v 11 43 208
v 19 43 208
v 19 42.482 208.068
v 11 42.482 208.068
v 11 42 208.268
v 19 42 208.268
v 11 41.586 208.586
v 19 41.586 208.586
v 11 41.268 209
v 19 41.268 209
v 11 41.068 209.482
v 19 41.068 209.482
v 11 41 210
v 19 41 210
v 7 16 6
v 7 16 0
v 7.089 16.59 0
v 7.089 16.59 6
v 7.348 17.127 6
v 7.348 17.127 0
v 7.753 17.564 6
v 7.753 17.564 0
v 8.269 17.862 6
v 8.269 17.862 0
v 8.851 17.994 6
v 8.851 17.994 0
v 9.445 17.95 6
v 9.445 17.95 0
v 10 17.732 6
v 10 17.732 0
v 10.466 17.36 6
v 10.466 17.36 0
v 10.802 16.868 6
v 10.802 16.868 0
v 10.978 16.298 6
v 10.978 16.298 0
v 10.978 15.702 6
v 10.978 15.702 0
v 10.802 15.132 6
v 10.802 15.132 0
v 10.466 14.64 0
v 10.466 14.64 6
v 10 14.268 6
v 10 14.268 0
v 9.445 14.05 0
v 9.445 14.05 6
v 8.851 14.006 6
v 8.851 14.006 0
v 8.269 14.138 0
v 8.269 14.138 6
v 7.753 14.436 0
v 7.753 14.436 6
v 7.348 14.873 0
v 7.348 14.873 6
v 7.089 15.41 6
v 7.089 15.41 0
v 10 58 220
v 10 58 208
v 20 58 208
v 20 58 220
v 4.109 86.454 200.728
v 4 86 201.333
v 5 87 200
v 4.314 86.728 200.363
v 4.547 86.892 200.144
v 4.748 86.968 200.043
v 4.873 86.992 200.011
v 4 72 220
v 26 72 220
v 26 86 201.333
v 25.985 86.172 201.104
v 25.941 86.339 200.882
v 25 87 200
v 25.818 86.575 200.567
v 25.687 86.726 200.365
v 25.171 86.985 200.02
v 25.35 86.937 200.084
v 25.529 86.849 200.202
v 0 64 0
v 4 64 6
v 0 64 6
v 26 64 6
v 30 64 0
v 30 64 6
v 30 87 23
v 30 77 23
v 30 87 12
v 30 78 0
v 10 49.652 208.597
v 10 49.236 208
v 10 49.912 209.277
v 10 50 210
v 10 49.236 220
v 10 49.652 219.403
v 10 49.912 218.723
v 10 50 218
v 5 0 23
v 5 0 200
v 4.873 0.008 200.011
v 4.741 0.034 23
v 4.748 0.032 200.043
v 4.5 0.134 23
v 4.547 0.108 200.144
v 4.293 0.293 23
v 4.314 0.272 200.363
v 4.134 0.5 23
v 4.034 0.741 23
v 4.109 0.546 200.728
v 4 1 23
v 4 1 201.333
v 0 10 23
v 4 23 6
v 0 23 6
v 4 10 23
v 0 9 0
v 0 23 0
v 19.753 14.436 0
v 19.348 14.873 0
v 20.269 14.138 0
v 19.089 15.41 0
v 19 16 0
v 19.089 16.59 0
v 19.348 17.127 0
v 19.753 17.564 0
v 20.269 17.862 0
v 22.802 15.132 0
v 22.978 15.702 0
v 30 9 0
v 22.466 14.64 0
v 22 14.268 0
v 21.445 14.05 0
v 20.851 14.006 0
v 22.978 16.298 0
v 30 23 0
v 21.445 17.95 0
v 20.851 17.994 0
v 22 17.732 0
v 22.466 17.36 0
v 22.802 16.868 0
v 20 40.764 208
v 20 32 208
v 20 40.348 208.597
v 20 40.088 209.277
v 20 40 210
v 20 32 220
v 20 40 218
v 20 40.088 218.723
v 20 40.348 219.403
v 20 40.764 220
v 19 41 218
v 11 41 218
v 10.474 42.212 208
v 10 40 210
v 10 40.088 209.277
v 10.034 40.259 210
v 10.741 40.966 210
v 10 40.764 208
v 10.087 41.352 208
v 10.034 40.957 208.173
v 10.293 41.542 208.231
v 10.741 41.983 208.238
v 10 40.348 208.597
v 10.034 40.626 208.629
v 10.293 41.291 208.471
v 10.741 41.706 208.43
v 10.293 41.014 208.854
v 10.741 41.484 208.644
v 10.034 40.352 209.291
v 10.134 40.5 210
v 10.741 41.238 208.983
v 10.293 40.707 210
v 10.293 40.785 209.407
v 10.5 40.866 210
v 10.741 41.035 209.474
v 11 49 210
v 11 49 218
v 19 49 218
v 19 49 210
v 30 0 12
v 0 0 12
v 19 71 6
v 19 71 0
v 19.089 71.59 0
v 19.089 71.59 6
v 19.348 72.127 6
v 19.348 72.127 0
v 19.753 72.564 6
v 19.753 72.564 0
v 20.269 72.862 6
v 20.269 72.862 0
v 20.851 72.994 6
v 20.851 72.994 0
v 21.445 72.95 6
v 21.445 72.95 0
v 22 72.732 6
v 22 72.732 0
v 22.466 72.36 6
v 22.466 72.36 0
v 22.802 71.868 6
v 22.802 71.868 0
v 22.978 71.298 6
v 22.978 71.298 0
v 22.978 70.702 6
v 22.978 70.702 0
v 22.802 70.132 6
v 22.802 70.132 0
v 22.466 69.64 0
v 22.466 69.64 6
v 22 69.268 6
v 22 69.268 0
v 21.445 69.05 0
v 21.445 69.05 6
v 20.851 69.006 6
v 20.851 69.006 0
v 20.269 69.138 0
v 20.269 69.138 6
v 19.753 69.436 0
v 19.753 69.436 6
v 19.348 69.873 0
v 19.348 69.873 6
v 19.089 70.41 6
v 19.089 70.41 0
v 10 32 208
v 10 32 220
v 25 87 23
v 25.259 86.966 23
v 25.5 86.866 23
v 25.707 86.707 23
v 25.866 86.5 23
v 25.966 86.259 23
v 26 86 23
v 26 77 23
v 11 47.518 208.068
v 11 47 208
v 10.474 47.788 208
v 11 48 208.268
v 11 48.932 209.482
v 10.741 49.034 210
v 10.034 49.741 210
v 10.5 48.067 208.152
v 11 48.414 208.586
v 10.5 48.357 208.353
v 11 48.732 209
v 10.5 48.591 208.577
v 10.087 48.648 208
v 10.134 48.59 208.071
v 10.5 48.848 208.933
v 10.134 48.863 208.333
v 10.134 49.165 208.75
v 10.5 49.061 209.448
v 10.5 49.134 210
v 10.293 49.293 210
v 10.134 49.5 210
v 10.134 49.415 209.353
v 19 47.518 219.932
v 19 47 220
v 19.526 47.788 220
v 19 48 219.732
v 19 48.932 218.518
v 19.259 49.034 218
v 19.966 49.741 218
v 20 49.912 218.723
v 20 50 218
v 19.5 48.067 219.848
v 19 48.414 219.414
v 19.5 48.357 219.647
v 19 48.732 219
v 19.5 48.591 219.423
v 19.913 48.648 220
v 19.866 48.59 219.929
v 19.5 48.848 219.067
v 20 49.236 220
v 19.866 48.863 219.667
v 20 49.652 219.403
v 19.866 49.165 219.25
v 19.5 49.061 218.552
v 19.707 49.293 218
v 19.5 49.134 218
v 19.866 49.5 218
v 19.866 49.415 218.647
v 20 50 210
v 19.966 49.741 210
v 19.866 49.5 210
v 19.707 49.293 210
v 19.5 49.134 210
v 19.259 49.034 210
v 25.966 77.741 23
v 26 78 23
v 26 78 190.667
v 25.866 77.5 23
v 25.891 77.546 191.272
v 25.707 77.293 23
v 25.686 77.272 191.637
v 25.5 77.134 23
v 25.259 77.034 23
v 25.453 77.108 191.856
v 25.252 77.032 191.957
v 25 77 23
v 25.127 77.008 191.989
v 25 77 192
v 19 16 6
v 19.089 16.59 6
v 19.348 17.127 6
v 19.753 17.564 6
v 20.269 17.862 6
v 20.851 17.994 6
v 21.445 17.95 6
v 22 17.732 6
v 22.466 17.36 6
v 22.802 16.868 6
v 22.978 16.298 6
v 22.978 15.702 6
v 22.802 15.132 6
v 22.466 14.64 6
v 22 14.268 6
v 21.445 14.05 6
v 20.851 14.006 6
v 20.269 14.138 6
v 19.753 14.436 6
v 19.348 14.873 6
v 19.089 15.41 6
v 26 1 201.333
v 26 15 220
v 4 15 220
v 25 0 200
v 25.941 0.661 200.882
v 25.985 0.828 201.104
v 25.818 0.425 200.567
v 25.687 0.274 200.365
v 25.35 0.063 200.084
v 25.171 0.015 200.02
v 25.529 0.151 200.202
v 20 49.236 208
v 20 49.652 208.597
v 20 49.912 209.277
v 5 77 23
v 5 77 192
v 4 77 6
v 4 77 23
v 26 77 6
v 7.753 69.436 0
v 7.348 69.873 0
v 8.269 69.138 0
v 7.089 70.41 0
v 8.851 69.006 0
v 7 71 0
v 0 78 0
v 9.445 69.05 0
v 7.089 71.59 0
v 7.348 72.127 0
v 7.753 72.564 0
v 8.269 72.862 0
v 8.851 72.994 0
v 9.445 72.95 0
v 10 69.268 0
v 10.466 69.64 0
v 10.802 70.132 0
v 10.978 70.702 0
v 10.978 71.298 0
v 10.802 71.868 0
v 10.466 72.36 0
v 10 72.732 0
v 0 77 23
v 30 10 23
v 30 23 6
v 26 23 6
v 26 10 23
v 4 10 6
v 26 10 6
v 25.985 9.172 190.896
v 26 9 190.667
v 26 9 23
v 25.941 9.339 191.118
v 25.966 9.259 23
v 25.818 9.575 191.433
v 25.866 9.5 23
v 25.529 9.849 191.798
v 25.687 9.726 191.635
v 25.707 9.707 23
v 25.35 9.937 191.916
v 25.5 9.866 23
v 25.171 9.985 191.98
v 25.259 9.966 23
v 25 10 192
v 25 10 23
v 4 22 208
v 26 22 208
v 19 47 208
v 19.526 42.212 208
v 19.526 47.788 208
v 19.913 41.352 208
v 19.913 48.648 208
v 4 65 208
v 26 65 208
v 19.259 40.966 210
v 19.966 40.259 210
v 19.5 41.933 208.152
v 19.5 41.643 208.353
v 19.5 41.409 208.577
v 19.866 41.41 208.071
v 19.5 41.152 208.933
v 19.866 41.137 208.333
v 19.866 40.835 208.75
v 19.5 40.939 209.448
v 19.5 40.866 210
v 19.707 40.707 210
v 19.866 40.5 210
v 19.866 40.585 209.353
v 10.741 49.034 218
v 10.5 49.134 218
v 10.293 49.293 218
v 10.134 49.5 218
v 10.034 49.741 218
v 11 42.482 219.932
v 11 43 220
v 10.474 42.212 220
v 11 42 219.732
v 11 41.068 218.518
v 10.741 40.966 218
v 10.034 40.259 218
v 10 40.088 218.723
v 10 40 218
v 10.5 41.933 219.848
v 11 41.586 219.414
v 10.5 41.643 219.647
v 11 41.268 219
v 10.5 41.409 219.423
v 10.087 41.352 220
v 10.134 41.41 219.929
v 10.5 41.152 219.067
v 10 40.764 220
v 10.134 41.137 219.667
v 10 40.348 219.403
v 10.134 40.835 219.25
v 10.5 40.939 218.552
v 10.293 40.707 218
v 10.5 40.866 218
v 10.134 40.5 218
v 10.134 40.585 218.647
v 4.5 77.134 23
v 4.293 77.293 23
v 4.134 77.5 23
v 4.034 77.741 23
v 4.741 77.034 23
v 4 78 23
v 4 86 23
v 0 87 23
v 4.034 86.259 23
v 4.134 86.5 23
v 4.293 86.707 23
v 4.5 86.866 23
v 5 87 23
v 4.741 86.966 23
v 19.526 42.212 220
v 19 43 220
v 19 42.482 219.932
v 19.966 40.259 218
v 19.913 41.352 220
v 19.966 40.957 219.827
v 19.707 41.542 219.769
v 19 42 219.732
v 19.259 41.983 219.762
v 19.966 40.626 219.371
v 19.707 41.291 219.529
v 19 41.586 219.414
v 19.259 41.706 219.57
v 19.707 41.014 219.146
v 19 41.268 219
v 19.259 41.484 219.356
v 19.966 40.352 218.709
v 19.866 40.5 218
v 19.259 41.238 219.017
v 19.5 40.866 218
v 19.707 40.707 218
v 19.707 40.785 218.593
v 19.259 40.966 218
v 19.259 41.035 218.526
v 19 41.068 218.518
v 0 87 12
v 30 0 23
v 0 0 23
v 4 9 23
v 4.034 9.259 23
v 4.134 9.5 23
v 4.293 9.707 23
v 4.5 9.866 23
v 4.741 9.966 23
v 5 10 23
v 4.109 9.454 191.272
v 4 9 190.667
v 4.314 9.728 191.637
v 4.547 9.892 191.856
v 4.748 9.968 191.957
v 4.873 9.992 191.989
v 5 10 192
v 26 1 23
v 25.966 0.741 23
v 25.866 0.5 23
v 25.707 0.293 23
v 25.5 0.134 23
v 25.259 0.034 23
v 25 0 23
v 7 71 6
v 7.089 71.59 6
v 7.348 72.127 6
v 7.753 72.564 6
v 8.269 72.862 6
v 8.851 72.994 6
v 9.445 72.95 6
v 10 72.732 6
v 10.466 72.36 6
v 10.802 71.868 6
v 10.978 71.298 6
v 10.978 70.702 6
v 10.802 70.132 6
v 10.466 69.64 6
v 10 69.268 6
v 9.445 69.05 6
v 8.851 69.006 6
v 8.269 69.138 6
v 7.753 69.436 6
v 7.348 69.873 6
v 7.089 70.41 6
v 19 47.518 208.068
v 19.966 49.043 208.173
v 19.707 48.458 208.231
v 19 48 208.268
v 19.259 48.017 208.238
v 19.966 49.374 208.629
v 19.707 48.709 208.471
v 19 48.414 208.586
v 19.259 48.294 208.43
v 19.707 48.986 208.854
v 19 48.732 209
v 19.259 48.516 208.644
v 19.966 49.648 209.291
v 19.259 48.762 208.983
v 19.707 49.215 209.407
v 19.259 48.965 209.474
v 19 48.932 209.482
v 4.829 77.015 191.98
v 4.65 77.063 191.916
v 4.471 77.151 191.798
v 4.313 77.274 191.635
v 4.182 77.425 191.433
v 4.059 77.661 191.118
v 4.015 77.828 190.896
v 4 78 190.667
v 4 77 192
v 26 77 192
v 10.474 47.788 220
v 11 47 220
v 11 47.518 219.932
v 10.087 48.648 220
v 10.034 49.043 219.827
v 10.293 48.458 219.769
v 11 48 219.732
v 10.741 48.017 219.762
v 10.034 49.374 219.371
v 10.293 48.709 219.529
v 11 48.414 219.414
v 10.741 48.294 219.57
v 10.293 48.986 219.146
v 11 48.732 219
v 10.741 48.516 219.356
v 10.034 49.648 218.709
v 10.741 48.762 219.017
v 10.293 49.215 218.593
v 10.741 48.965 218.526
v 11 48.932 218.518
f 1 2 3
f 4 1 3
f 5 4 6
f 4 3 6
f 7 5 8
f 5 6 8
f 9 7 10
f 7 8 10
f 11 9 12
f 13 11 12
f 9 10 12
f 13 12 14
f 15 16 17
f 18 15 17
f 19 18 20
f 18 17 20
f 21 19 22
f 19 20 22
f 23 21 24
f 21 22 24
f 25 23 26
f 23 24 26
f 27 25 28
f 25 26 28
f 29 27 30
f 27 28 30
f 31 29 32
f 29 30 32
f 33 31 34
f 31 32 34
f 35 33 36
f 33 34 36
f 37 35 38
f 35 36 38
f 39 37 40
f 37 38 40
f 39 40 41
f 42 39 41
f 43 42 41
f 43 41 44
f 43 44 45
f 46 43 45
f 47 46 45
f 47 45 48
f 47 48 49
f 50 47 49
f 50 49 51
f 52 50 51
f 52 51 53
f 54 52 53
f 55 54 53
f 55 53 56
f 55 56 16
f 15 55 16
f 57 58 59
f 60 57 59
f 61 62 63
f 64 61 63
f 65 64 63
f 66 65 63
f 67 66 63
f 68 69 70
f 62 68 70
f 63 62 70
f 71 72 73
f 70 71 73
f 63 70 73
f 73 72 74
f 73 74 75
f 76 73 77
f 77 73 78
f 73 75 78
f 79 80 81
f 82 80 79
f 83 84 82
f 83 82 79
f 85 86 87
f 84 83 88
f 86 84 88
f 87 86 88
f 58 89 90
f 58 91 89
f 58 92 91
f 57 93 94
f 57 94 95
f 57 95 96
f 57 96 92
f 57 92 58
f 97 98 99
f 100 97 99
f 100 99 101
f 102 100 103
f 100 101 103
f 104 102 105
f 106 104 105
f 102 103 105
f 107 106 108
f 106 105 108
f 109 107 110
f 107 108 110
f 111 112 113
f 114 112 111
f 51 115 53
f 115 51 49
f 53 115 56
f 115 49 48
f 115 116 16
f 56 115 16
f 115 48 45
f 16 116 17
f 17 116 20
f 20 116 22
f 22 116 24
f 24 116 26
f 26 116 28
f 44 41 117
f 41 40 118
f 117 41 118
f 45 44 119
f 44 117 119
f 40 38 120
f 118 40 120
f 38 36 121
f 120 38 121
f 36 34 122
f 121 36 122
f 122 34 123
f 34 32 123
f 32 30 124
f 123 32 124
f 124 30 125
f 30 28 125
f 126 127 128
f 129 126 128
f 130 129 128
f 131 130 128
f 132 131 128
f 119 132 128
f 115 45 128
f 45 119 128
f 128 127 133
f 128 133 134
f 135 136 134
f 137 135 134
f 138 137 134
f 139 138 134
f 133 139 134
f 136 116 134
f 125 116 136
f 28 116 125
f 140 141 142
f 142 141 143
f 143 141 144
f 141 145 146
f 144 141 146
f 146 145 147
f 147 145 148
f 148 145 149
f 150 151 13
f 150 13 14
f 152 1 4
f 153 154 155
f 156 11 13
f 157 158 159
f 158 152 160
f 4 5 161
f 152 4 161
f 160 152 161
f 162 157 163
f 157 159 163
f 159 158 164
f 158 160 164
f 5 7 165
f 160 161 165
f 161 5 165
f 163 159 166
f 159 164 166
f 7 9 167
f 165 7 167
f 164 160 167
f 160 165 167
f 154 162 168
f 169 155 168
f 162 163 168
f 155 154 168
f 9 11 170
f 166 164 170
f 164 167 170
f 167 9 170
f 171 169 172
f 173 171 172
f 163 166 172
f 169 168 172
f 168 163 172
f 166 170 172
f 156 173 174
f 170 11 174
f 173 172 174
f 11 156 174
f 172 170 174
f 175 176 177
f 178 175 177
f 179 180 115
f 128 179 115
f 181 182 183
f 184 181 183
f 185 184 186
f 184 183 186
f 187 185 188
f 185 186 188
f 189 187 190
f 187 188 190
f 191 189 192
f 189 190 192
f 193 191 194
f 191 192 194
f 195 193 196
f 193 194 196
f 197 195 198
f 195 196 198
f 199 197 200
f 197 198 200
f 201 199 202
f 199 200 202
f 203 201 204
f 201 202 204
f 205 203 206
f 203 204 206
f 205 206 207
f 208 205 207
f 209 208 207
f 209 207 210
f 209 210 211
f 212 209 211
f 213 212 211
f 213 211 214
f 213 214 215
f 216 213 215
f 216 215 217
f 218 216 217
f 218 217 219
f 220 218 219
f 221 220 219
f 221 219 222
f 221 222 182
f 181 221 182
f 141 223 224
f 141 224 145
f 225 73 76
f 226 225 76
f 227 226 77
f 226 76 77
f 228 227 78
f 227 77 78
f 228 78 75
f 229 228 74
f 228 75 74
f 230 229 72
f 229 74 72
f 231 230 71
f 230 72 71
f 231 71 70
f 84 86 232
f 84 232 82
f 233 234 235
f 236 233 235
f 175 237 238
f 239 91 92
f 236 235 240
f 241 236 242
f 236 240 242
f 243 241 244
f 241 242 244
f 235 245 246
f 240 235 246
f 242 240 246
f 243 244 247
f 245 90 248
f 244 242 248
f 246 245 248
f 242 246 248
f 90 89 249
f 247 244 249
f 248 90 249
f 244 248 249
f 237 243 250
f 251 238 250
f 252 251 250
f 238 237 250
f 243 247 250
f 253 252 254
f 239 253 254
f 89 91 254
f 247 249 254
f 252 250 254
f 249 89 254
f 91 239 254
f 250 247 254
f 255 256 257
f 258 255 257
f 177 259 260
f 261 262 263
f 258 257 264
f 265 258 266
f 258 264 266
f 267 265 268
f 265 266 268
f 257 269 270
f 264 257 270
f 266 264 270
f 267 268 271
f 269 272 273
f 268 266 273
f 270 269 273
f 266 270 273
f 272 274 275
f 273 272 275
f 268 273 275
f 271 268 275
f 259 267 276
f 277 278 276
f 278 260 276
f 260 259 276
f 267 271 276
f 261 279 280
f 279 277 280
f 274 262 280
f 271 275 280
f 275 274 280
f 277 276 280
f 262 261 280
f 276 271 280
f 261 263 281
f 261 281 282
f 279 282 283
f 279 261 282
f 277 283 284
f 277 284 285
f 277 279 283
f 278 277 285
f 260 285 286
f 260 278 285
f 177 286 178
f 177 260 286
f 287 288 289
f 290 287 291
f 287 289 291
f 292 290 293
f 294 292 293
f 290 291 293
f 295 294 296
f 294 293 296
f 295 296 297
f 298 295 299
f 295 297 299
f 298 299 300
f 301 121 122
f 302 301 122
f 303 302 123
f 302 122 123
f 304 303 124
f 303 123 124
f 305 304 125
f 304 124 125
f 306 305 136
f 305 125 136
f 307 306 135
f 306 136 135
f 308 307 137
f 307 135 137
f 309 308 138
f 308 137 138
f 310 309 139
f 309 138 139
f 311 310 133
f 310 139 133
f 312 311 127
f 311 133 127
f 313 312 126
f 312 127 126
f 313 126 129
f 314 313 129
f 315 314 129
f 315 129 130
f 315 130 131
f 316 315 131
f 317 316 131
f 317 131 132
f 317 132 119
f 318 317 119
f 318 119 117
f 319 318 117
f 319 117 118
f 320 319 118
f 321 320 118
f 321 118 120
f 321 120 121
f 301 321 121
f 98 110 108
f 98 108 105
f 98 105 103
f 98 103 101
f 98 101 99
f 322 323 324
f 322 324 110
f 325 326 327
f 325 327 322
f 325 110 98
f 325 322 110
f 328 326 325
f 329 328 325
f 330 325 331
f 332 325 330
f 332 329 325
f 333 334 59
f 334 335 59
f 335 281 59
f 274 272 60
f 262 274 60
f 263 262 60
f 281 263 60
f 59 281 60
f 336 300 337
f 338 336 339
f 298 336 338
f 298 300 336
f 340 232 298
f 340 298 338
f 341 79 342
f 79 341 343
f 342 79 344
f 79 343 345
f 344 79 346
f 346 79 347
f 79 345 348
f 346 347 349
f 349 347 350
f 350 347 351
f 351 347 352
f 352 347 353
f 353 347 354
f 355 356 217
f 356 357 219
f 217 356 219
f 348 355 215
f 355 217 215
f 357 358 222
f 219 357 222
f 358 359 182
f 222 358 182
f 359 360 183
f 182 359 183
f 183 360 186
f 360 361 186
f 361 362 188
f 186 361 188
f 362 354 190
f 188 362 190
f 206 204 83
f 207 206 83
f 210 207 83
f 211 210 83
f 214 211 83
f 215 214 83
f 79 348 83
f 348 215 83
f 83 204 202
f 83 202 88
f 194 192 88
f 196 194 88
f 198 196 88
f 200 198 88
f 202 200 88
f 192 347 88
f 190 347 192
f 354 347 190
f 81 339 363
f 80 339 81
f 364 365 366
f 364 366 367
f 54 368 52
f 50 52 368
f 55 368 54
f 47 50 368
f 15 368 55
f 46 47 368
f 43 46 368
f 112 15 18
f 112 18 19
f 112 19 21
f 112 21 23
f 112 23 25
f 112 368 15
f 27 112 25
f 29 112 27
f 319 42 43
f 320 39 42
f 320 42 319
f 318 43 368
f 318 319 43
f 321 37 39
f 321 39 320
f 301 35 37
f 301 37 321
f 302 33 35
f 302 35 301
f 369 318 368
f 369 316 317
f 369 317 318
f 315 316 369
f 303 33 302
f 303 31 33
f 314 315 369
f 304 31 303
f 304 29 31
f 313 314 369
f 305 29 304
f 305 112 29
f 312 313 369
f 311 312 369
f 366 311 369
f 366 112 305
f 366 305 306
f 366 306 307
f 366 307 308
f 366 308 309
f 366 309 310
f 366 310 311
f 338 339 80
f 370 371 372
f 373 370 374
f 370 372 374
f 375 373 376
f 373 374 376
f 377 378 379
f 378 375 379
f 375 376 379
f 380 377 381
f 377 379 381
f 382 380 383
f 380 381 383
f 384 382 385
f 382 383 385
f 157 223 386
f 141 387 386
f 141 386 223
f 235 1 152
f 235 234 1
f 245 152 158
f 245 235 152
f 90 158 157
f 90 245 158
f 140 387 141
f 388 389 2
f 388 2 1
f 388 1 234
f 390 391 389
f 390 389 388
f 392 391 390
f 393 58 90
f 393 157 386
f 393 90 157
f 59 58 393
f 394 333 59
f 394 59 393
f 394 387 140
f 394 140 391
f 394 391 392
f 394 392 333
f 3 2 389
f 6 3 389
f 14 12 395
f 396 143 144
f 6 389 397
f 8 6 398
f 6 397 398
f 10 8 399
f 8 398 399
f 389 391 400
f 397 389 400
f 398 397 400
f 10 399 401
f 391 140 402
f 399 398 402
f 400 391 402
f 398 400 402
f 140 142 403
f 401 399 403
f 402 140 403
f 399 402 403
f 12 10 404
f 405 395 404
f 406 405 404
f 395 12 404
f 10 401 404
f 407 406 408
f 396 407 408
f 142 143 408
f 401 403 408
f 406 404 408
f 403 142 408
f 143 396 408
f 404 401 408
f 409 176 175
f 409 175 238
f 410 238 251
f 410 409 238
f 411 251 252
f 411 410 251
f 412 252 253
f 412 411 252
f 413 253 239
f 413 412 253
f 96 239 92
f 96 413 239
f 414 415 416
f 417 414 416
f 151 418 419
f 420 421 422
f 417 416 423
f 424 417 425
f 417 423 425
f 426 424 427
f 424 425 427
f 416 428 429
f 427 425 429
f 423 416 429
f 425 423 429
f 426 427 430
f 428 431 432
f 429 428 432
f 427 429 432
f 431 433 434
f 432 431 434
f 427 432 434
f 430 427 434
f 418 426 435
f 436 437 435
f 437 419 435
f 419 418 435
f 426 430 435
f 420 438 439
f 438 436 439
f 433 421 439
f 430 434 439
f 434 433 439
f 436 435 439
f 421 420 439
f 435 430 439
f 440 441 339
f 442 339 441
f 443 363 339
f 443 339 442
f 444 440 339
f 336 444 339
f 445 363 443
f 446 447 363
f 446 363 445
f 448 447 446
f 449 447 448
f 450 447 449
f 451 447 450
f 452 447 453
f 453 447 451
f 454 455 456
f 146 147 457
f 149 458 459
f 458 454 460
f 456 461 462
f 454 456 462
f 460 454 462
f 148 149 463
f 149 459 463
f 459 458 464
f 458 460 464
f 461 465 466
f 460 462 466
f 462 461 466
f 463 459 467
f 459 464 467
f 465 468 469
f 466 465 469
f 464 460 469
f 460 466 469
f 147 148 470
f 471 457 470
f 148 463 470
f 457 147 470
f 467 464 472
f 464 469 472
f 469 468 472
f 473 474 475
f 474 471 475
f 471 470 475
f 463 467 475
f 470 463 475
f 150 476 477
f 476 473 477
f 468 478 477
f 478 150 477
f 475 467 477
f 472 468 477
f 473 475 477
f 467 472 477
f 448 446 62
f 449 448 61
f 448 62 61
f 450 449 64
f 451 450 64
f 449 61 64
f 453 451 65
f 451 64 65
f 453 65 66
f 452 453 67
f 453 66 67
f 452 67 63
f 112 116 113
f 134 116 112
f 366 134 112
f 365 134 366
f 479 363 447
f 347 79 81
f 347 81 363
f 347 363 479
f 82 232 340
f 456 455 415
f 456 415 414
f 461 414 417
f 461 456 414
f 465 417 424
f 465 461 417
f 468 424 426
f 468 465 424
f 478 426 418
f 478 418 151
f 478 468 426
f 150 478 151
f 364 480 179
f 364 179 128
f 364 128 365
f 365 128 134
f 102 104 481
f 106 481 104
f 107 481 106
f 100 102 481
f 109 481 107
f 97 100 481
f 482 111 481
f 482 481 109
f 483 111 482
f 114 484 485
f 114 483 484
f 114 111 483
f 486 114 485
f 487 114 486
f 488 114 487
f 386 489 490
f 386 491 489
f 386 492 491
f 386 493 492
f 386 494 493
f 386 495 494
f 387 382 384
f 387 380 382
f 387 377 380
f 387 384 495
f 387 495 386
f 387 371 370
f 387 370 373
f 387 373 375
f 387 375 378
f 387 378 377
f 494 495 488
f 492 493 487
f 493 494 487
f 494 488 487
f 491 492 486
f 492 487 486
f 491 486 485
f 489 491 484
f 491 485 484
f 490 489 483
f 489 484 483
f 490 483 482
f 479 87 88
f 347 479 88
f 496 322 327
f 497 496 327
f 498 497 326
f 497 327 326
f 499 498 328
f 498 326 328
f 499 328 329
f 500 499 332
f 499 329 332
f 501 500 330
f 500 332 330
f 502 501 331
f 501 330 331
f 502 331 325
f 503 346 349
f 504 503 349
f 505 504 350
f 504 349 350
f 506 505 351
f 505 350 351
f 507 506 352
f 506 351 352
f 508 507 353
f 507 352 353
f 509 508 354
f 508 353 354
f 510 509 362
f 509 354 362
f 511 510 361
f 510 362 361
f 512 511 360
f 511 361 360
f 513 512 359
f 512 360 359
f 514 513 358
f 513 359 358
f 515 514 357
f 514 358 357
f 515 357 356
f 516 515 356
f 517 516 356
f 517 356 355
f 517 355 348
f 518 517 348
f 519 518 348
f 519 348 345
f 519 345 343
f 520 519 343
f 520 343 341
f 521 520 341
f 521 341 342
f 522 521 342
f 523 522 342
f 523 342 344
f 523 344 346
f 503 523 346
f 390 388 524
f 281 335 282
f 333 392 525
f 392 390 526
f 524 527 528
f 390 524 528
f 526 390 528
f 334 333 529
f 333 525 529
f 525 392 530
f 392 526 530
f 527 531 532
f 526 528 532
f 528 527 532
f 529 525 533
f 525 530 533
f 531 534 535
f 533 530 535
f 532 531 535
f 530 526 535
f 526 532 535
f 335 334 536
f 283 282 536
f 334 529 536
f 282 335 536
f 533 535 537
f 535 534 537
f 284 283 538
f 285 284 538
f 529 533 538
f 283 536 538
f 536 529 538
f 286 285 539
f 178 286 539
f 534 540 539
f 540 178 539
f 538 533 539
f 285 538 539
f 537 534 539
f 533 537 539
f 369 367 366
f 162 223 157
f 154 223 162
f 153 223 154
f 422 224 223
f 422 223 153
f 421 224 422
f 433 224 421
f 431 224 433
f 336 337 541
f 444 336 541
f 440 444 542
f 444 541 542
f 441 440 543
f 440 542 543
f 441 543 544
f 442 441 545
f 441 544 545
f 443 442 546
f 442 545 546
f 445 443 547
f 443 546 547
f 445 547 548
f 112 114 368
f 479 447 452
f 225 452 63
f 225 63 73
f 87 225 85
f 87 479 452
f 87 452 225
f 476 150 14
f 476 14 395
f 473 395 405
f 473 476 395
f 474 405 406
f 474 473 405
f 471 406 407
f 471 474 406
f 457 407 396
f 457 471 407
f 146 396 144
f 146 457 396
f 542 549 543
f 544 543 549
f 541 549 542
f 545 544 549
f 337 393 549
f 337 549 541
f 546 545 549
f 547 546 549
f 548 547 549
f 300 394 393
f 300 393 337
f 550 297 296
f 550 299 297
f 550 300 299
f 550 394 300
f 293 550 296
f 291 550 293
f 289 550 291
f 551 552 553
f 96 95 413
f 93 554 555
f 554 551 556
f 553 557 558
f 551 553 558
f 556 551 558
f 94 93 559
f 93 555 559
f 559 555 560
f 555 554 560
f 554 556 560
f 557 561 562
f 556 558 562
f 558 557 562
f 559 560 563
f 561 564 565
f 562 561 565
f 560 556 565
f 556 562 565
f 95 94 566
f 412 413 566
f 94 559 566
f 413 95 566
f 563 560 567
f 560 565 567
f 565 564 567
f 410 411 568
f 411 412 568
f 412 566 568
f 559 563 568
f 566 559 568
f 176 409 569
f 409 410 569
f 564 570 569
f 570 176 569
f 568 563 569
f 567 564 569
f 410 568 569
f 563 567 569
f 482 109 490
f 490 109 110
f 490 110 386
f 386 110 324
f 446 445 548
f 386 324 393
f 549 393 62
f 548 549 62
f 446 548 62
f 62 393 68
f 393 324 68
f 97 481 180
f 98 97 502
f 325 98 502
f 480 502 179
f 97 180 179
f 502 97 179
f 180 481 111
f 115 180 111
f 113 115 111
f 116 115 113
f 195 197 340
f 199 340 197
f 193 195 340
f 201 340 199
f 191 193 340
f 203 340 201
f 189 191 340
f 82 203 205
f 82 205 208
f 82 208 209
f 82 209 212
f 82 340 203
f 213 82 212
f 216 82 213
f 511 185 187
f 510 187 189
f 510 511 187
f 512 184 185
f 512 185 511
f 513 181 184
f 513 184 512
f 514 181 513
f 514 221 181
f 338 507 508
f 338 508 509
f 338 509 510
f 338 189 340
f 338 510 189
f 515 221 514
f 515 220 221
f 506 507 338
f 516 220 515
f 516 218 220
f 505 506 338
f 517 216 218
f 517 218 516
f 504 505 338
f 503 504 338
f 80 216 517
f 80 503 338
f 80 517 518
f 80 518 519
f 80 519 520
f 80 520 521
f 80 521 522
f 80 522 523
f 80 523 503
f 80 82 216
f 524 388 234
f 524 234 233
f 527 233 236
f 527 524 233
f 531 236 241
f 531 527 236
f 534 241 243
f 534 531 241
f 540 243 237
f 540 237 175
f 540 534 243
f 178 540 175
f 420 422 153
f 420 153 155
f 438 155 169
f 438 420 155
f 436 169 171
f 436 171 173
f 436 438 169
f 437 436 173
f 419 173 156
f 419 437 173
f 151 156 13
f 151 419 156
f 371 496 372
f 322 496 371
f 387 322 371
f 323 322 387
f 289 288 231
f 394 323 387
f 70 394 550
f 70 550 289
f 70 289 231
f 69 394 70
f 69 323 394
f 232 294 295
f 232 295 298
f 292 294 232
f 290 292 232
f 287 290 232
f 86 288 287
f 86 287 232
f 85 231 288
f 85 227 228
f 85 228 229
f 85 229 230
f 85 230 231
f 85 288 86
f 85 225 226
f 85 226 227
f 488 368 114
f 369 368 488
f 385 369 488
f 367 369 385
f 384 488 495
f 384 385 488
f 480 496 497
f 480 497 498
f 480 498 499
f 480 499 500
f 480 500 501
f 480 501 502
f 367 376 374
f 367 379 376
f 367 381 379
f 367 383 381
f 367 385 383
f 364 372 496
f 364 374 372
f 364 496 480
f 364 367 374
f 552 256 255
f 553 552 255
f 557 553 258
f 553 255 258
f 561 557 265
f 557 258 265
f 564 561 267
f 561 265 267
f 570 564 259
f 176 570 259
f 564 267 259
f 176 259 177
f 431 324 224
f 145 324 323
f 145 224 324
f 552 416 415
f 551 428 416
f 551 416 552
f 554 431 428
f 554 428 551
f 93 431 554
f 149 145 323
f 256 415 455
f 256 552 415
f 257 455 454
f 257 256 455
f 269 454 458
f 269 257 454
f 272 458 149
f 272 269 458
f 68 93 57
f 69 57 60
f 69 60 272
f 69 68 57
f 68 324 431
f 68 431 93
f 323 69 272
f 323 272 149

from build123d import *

# Parameters (mm, degrees)
SKETCH1_W                 = 30
SKETCH1_H                 = 87
BOSS_EXTRUDE1_DEPTH       = 220
CUT_EXTRUDE1_DEPTH        = 239.472220604
SKETCH3_W                 = 22
SKETCH3_H                 = 22
CUT_EXTRUDE2_DEPTH        = 13
SKETCH4_W                 = 22
SKETCH4_H                 = 22
CUT_EXTRUDE3_DEPTH        = 13
CUT_EXTRUDE4_REACH        = 240.472
SKETCH5_W                 = 10
SKETCH5_H                 = 9
SKETCH6_W                 = 4
SKETCH6_H                 = 87
CUT_EXTRUDE5_DEPTH        = 197
F_4_0MM_DOWEL_HOLE1_D     = 4
F_4_0MM_DOWEL_HOLE1_DEPTH = 6
FILLET1_R                 = 2
FILLET2_R                 = 1


with BuildPart() as part:
    # Sketch1 → Boss-Extrude1 (new body)
    with BuildSketch(Plane.XY):
        with Locations((15, 43.5)):
            Rectangle(SKETCH1_W, SKETCH1_H)
    extrude(amount=BOSS_EXTRUDE1_DEPTH)

    # Sketch2 → Cut-Extrude1 (cut, through all)
    with BuildSketch(Plane(origin=(30, 0, 0), x_dir=(0, 0, -1), z_dir=(1, 0, 0))):
        Polygon((-192, 77), (-23, 77), (-6, 64), (0, 64), (0, 23), (-6, 23), (-23, 10), (-192, 10), (-208, 22), (-208, 65), align=None)
        Polygon((0, 87), (-12, 87), (0, 78), align=None)
        Polygon((0, 0), (-12, 0), (0, 9), align=None)
        Polygon((-220, 87), (-220, 72), (-200, 87), align=None)
        Polygon((-220, 0), (-220, 15), (-200, 0), align=None)
    extrude(amount=-CUT_EXTRUDE1_DEPTH, mode=Mode.SUBTRACT)

    # Sketch3 → Cut-Extrude2 (cut)
    with BuildSketch(Plane(origin=(0, 64, 0), x_dir=(-1, 0, 0), z_dir=(0, -1, 0))):
        with Locations((-15, -17)):
            Rectangle(SKETCH3_W, SKETCH3_H)
    extrude(amount=-CUT_EXTRUDE2_DEPTH, mode=Mode.SUBTRACT)

    # Sketch4 → Cut-Extrude3 (cut)
    with BuildSketch(Plane(origin=(0, 23, 0), x_dir=(1, 0, 0), z_dir=(0, 1, 0))):
        with Locations((15, -17)):
            Rectangle(SKETCH4_W, SKETCH4_H)
    extrude(amount=-CUT_EXTRUDE3_DEPTH, mode=Mode.SUBTRACT)

    # Sketch5 → Cut-Extrude4 (cut, up to next)
    with BuildSketch(Plane.XY.offset(220), mode=Mode.PRIVATE) as cut_extrude4_sk1:
        with Locations((15, 53.5)):
            Rectangle(SKETCH5_W, SKETCH5_H)
    cut_extrude4_tool1 = extrude(cut_extrude4_sk1.sketch, amount=-CUT_EXTRUDE4_REACH, mode=Mode.PRIVATE) & part.part
    # Sketch5 → Cut-Extrude4 (cut, up to next)
    with BuildSketch(Plane.XY.offset(220), mode=Mode.PRIVATE) as cut_extrude4_sk2:
        with Locations((15, 36.5)):
            Rectangle(SKETCH5_W, SKETCH5_H)
    cut_extrude4_tool2 = extrude(cut_extrude4_sk2.sketch, amount=-CUT_EXTRUDE4_REACH, mode=Mode.PRIVATE) & part.part
    add(cut_extrude4_tool1.solids().sort_by_distance((15, 53.5, 220))[0], mode=Mode.SUBTRACT)
    add(cut_extrude4_tool2.solids().sort_by_distance((15, 36.5, 220))[0], mode=Mode.SUBTRACT)

    # Sketch6 → Cut-Extrude5 (cut)
    with BuildSketch(Plane.XY.offset(220)):
        with Locations((2, 43.5)):
            Rectangle(SKETCH6_W, SKETCH6_H)
        with Locations((28, 43.5)):
            Rectangle(SKETCH6_W, SKETCH6_H)
    extrude(amount=-CUT_EXTRUDE5_DEPTH, mode=Mode.SUBTRACT)

    # Ø4.0mm Dowel Hole1
    with Locations(Plane.XY.offset(6)):
        with Locations((9, 16), (9, 71), (21, 71), (21, 16)):
            Hole(F_4_0MM_DOWEL_HOLE1_D / 2, depth=F_4_0MM_DOWEL_HOLE1_DEPTH)

    # Fillet1
    fillet1_edges = [part.edges().sort_by_distance(p)[0] for p in [
        (15, 49, 220),
        (15, 49, 208),
        (15, 41, 220),
        (15, 41, 208),
    ]]
    fillet(fillet1_edges, radius=FILLET1_R)

    # Fillet2
    # the kernel refuses this fillet: 1 mm, written as the material it adds along each edge
    with BuildSketch(Plane(origin=(10, 49, 218), x_dir=(1, 0, 0), z_dir=(0, 0, -1)), Plane(origin=(20, 41, 218), x_dir=(-1, 0, 0), z_dir=(0, 0, -1))) as fillet2_piece_1:
        with BuildLine():
            CenterArc((FILLET2_R, -FILLET2_R), FILLET2_R, 90, 90)
            Line((0, -FILLET2_R), (0, 0))
            Line((0, 0), (FILLET2_R, 0))
        make_face()
    extrude(amount=8)
    with BuildSketch(Plane(origin=(20, 49, 218), x_dir=(-1, 0, 0), z_dir=(0, 0, -1)), Plane(origin=(10, 41, 218), x_dir=(1, 0, 0), z_dir=(0, 0, -1))) as fillet2_piece_2:
        with BuildLine():
            CenterArc((FILLET2_R, FILLET2_R), FILLET2_R, 180, 90)
            Line((0, FILLET2_R), (0, 0))
            Line((0, 0), (FILLET2_R, 0))
        make_face()
    extrude(amount=8)
    with BuildSketch(Plane(origin=(10, 47, 210), x_dir=(0, -0.9491428341660849, -0.31484580408697216), z_dir=(0, -0.31484580408697216, 0.9491428341660849))) as fillet2_piece_3_section:
        with BuildLine():
            CenterArc((2 + FILLET2_R, FILLET2_R), FILLET2_R, 180, 90)
            Line((2 + FILLET2_R, 0), (2, 0))
            Line((2, 0), (2, FILLET2_R))
        make_face()
    fillet2_piece_3 = revolve(axis=Axis((10, 47, 210), (1, 0, 0)), revolution_arc=161.648494619, mode=Mode.PRIVATE)
    fillet2_piece_3 = split(fillet2_piece_3, bisect_by=Plane(origin=(10.272150961, 48.462196414, 208), z_dir=(0, 0, 1)), keep=Keep.TOP, mode=Mode.PRIVATE)
    add(fillet2_piece_3)
    with BuildSketch(Plane(origin=(20, 47, 210), x_dir=(0, -0.9491428341660849, -0.31484580408697216), z_dir=(0, -0.31484580408697216, 0.9491428341660849))) as fillet2_piece_4_section:
        with BuildLine():
            CenterArc((2 + FILLET2_R, -FILLET2_R), FILLET2_R, 90, 90)
            Line((2 + FILLET2_R, 0), (2, 0))
            Line((2, 0), (2, -FILLET2_R))
        make_face()
    fillet2_piece_4 = revolve(axis=Axis((20, 47, 210), (1, 0, 0)), revolution_arc=161.648494619, mode=Mode.PRIVATE)
    fillet2_piece_4 = split(fillet2_piece_4, bisect_by=Plane(origin=(19.727849107, 48.462196279, 208), z_dir=(0, 0, 1)), keep=Keep.TOP, mode=Mode.PRIVATE)
    add(fillet2_piece_4)
    with BuildSketch(Plane(origin=(20, 43, 210), x_dir=(0, 0.9491428341660849, -0.31484580408697216), z_dir=(0, 0.31484580408697216, 0.9491428341660849))) as fillet2_piece_5_section:
        with BuildLine():
            CenterArc((2 + FILLET2_R, FILLET2_R), FILLET2_R, 180, 90)
            Line((2 + FILLET2_R, 0), (2, 0))
            Line((2, 0), (2, FILLET2_R))
        make_face()
    fillet2_piece_5 = revolve(axis=Axis((20, 43, 210), (-1, 0, 0)), revolution_arc=161.648494619, mode=Mode.PRIVATE)
    fillet2_piece_5 = split(fillet2_piece_5, bisect_by=Plane(origin=(19.727848664, 41.537804063, 208), z_dir=(0, 0, 1)), keep=Keep.TOP, mode=Mode.PRIVATE)
    add(fillet2_piece_5)
    with BuildSketch(Plane(origin=(10, 43, 210), x_dir=(0, 0.9491428341660849, -0.31484580408697216), z_dir=(0, 0.31484580408697216, 0.9491428341660849))) as fillet2_piece_6_section:
        with BuildLine():
            CenterArc((2 + FILLET2_R, -FILLET2_R), FILLET2_R, 90, 90)
            Line((2 + FILLET2_R, 0), (2, 0))
            Line((2, 0), (2, -FILLET2_R))
        make_face()
    fillet2_piece_6 = revolve(axis=Axis((10, 43, 210), (-1, 0, 0)), revolution_arc=161.648494619, mode=Mode.PRIVATE)
    fillet2_piece_6 = split(fillet2_piece_6, bisect_by=Plane(origin=(10.272151404, 41.537803928, 208), z_dir=(0, 0, 1)), keep=Keep.TOP, mode=Mode.PRIVATE)
    add(fillet2_piece_6)
    with BuildSketch(Plane(origin=(20, 47, 218), x_dir=(0, -0.9491428341660849, 0.31484580408697216), z_dir=(0, -0.31484580408697216, -0.9491428341660849))) as fillet2_piece_7_section:
        with BuildLine():
            CenterArc((2 + FILLET2_R, FILLET2_R), FILLET2_R, 180, 90)
            Line((2 + FILLET2_R, 0), (2, 0))
            Line((2, 0), (2, FILLET2_R))
        make_face()
    fillet2_piece_7 = revolve(axis=Axis((20, 47, 218), (-1, 0, 0)), revolution_arc=161.648494619, mode=Mode.PRIVATE)
    fillet2_piece_7 = split(fillet2_piece_7, bisect_by=Plane(origin=(19.727849077, 48.462196209, 220), z_dir=(0, 0, -1)), keep=Keep.TOP, mode=Mode.PRIVATE)
    add(fillet2_piece_7)
    with BuildSketch(Plane(origin=(10, 47, 218), x_dir=(0, -0.9491428341660849, 0.31484580408697216), z_dir=(0, -0.31484580408697216, -0.9491428341660849))) as fillet2_piece_8_section:
        with BuildLine():
            CenterArc((2 + FILLET2_R, -FILLET2_R), FILLET2_R, 90, 90)
            Line((2, -FILLET2_R), (2, 0))
            Line((2, 0), (2 + FILLET2_R, 0))
        make_face()
    fillet2_piece_8 = revolve(axis=Axis((10, 47, 218), (-1, 0, 0)), revolution_arc=161.648494619, mode=Mode.PRIVATE)
    fillet2_piece_8 = split(fillet2_piece_8, bisect_by=Plane(origin=(10.272143952, 48.462199818, 220), z_dir=(0, 0, -1)), keep=Keep.TOP, mode=Mode.PRIVATE)
    add(fillet2_piece_8)
    with BuildSketch(Plane(origin=(10, 43, 218), x_dir=(0, 0.9491428341660849, 0.31484580408697216), z_dir=(0, 0.31484580408697216, -0.9491428341660849))) as fillet2_piece_9_section:
        with BuildLine():
            CenterArc((2 + FILLET2_R, FILLET2_R), FILLET2_R, 180, 90)
            Line((2 + FILLET2_R, 0), (2, 0))
            Line((2, 0), (2, FILLET2_R))
        make_face()
    fillet2_piece_9 = revolve(axis=Axis((10, 43, 218), (1, 0, 0)), revolution_arc=161.648494619, mode=Mode.PRIVATE)
    fillet2_piece_9 = split(fillet2_piece_9, bisect_by=Plane(origin=(10.272150964, 41.537803607, 220), z_dir=(0, 0, -1)), keep=Keep.TOP, mode=Mode.PRIVATE)
    add(fillet2_piece_9)
    with BuildSketch(Plane(origin=(20, 43, 218), x_dir=(0, 0.9491428341660849, 0.31484580408697216), z_dir=(0, 0.31484580408697216, -0.9491428341660849))) as fillet2_piece_10_section:
        with BuildLine():
            CenterArc((2 + FILLET2_R, -FILLET2_R), FILLET2_R, 90, 90)
            Line((2 + FILLET2_R, 0), (2, 0))
            Line((2, 0), (2, -FILLET2_R))
        make_face()
    fillet2_piece_10 = revolve(axis=Axis((20, 43, 218), (1, 0, 0)), revolution_arc=161.648494619, mode=Mode.PRIVATE)
    fillet2_piece_10 = split(fillet2_piece_10, bisect_by=Plane(origin=(19.727849077, 41.537803791, 220), z_dir=(0, 0, -1)), keep=Keep.TOP, mode=Mode.PRIVATE)
    add(fillet2_piece_10)
    # the kernel refuses this fillet: 1 mm, written as the material it takes off along each edge
    with BuildSketch(Plane(origin=(4, 0, 202.5), x_dir=(0, 1, 0), z_dir=(0, 0, -1)), Plane(origin=(26, 87, 202.5), x_dir=(0, -1, 0), z_dir=(0, 0, -1))) as fillet2_2_piece_1:
        with BuildLine():
            CenterArc((FILLET2_R, FILLET2_R), FILLET2_R, 180, 90)
            Line((0, FILLET2_R), (0, 0))
            Line((0, 0), (FILLET2_R, 0))
        make_face()
    extrude(amount=179.5, mode=Mode.SUBTRACT)
    with BuildSketch(Plane(origin=(4, 10, 23), x_dir=(0, -1, 0), z_dir=(0, 0, 1))) as fillet2_2_piece_2_section:
        with BuildLine():
            CenterArc((FILLET2_R, FILLET2_R), FILLET2_R, 180, 90)
            Line((0, FILLET2_R), (0, 0))
            Line((0, 0), (FILLET2_R, 0))
        make_face()
    fillet2_2_piece_2 = extrude(amount=171.5, mode=Mode.PRIVATE)
    fillet2_2_piece_2 = split(fillet2_2_piece_2, bisect_by=Plane(origin=(4.130770438, -71.137574021, 83.816567972), z_dir=(0, 0.8, -0.6)), keep=Keep.TOP, mode=Mode.PRIVATE)
    add(fillet2_2_piece_2, mode=Mode.SUBTRACT)
    with BuildSketch(Plane(origin=(4, 77, 194.5), x_dir=(0, 1, 0), z_dir=(0, 0, -1))) as fillet2_2_piece_3_section:
        with BuildLine():
            CenterArc((FILLET2_R, FILLET2_R), FILLET2_R, 180, 90)
            Line((0, FILLET2_R), (0, 0))
            Line((0, 0), (FILLET2_R, 0))
        make_face()
    fillet2_2_piece_3 = extrude(amount=171.5, mode=Mode.PRIVATE)
    fillet2_2_piece_3 = split(fillet2_2_piece_3, bisect_by=Plane(origin=(4.223692297, 117.641585147, 137.811219805), z_dir=(0, -0.8, -0.6)), keep=Keep.TOP, mode=Mode.PRIVATE)
    add(fillet2_2_piece_3, mode=Mode.SUBTRACT)
    with BuildSketch(Plane(origin=(4, 87, 202.5), x_dir=(0, -1, 0), z_dir=(0, 0, -1)), Plane(origin=(26, 0, 202.5), x_dir=(0, 1, 0), z_dir=(0, 0, -1))) as fillet2_2_piece_4:
        with BuildLine():
            CenterArc((FILLET2_R, -FILLET2_R), FILLET2_R, 90, 90)
            Line((0, -FILLET2_R), (0, 0))
            Line((0, 0), (FILLET2_R, 0))
        make_face()
    extrude(amount=179.5, mode=Mode.SUBTRACT)
    with BuildSketch(Plane(origin=(26, 10, 23), x_dir=(0, -1, 0), z_dir=(0, 0, 1))) as fillet2_2_piece_5_section:
        with BuildLine():
            CenterArc((FILLET2_R, -FILLET2_R), FILLET2_R, 90, 90)
            Line((0, -FILLET2_R), (0, 0))
            Line((0, 0), (FILLET2_R, 0))
        make_face()
    fillet2_2_piece_5 = extrude(amount=171.5, mode=Mode.PRIVATE)
    fillet2_2_piece_5 = split(fillet2_2_piece_5, bisect_by=Plane(origin=(25.869229562, -71.137574021, 83.816567972), z_dir=(0, 0.8, -0.6)), keep=Keep.TOP, mode=Mode.PRIVATE)
    add(fillet2_2_piece_5, mode=Mode.SUBTRACT)
    with BuildSketch(Plane(origin=(26, 77, 194.5), x_dir=(0, 1, 0), z_dir=(0, 0, -1))) as fillet2_2_piece_6_section:
        with BuildLine():
            CenterArc((FILLET2_R, -FILLET2_R), FILLET2_R, 90, 90)
            Line((0, -FILLET2_R), (0, 0))
            Line((0, 0), (FILLET2_R, 0))
        make_face()
    fillet2_2_piece_6 = extrude(amount=171.5, mode=Mode.PRIVATE)
    fillet2_2_piece_6 = split(fillet2_2_piece_6, bisect_by=Plane(origin=(25.776307703, 117.641585147, 137.811219805), z_dir=(0, -0.8, -0.6)), keep=Keep.TOP, mode=Mode.PRIVATE)
    add(fillet2_2_piece_6, mode=Mode.SUBTRACT)


solid = part.part
